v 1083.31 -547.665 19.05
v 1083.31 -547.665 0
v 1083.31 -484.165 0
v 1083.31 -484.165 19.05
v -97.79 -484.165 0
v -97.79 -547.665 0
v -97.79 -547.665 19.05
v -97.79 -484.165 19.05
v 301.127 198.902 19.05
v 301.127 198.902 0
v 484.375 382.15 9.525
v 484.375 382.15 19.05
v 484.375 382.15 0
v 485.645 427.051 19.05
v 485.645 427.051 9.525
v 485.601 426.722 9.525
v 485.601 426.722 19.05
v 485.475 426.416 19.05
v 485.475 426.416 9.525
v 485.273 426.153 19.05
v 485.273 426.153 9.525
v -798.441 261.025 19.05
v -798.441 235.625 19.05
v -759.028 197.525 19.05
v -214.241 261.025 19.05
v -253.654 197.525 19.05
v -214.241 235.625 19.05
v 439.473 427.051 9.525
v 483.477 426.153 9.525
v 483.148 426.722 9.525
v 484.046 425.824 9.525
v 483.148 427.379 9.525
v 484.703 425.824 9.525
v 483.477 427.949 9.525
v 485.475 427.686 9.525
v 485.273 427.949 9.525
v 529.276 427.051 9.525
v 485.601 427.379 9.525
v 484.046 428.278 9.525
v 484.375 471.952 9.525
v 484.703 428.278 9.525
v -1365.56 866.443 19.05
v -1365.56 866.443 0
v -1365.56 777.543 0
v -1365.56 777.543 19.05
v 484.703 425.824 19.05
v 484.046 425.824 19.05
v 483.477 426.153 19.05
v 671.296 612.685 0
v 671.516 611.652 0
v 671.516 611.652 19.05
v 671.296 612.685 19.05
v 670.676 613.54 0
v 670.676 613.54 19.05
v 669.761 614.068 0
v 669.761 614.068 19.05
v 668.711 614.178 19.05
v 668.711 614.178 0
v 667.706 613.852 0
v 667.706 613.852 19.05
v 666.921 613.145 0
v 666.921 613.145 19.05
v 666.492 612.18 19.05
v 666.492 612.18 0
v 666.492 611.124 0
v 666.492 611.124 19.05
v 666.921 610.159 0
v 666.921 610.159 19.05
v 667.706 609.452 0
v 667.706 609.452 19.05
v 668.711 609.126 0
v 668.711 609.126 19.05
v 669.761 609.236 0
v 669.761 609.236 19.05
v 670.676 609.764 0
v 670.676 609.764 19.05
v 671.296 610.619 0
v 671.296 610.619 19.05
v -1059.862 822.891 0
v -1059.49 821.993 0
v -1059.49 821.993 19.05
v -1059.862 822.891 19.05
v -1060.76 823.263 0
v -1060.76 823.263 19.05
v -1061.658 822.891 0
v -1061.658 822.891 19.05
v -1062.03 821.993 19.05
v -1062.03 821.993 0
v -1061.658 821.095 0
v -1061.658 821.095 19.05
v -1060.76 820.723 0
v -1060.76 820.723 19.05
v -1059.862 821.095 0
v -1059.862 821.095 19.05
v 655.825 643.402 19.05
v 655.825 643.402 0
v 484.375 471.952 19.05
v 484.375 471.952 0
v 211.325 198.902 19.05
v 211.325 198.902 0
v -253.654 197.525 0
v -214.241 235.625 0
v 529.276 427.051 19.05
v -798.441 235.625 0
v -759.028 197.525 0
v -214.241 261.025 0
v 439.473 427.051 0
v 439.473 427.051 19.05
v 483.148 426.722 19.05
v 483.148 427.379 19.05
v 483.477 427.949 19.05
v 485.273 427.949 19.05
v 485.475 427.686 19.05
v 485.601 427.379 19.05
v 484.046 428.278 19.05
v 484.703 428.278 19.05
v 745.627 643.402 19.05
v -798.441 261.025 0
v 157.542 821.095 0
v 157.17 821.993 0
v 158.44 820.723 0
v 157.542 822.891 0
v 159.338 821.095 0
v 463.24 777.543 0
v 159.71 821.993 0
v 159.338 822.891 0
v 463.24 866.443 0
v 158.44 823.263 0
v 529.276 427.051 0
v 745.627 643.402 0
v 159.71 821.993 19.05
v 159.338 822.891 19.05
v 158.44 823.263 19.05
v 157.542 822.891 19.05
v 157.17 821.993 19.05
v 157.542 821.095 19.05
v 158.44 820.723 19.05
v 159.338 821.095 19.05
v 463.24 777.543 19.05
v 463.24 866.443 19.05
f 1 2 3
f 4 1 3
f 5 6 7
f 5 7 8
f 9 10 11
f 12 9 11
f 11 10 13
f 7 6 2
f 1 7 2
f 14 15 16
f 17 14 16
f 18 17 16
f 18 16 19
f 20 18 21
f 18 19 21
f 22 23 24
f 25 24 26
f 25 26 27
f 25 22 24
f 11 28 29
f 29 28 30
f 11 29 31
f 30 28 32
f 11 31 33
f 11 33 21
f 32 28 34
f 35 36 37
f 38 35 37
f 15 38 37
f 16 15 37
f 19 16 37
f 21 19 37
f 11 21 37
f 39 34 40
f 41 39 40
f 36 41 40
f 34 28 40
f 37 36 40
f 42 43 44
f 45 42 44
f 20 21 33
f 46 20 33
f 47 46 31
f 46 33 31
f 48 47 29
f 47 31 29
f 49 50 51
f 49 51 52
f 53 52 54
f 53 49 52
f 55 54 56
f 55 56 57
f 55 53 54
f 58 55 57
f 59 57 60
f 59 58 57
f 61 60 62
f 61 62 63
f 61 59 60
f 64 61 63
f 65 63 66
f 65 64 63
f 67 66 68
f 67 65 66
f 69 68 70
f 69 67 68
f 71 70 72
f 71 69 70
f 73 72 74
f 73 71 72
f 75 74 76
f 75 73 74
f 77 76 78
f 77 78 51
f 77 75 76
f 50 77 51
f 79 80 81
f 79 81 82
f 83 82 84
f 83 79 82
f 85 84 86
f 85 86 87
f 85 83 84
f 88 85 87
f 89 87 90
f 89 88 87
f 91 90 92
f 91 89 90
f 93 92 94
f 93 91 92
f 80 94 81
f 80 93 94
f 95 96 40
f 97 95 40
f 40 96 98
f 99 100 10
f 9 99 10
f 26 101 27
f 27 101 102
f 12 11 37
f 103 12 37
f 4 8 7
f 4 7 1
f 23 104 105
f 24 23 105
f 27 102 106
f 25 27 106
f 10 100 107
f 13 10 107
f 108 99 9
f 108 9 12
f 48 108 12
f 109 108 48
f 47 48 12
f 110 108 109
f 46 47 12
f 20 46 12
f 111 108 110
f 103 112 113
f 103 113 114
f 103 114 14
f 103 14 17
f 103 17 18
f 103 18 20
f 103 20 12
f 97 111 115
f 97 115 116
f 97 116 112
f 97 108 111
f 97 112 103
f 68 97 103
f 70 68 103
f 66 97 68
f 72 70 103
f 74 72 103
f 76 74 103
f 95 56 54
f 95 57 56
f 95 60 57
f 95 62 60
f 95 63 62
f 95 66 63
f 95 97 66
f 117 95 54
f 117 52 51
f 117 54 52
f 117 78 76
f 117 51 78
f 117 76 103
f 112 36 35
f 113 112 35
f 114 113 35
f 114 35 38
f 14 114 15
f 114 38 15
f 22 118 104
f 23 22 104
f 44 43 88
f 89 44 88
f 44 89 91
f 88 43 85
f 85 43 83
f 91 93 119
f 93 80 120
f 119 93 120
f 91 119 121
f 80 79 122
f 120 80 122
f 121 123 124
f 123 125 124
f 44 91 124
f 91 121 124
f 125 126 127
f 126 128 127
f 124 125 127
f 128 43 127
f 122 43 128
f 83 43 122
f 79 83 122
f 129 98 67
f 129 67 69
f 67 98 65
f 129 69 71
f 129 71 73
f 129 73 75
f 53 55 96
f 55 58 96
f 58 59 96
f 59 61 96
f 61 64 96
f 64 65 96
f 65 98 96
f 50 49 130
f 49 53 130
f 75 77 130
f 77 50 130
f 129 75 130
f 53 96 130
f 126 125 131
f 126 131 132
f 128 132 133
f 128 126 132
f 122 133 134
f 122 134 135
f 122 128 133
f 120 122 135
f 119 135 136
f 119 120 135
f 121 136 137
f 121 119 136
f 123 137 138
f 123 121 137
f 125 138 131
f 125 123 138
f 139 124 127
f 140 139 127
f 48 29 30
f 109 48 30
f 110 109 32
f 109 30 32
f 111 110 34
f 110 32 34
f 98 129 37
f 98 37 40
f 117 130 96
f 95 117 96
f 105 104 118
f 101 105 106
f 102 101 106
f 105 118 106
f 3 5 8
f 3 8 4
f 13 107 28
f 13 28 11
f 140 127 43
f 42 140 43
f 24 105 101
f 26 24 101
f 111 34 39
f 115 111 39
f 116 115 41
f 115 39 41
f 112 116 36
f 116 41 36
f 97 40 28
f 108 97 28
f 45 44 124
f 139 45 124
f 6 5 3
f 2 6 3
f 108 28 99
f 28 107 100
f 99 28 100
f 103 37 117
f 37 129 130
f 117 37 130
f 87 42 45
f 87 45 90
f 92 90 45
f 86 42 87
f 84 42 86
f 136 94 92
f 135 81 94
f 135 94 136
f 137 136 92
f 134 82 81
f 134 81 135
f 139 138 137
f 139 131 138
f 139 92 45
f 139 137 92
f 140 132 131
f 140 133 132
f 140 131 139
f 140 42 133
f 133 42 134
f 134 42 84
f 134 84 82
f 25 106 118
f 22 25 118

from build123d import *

# Parameters (mm, degrees)
F0_R     = 1.27
F4_DEPTH = 19.05
F5_DEPTH = 19.05
F3_W     = 1181.1
F3_H     = 63.5
F6_DEPTH = 19.05
F2_R     = 2.54
F7_DEPTH = 19.05
F8_DEPTH = 9.525


with BuildPart() as f4:
    # F0 (on Top) → F4 (new body)
    with BuildSketch(Plane.XY):
        Polygon((463.2404299736, 866.4432381392), (-1365.5595700264, 866.4432381392), (-1365.5595700264, 777.5432381392), (463.2404299736, 777.5432381392), (463.2404299736, 821.9932381392), align=None)
        with Locations((-1060.7595700264, 821.9932381392)):
            Circle(F0_R, mode=Mode.SUBTRACT)
        with Locations((158.4404299736, 821.9932381392)):
            Circle(F0_R, mode=Mode.SUBTRACT)
    extrude(amount=F4_DEPTH)


with BuildPart() as f5:
    # F1 (on Top) → F5 (new body)
    with BuildSketch(Plane.XY):
        Polygon((-214.2413890027, 261.0249788087), (-506.3413890027, 261.0249788087), (-506.3413890027, 197.5249788087), (-253.6544868998, 197.5249788087), (-214.2413890027, 235.6249788087), align=None)
        Polygon((-506.3413890027, 261.0249788087), (-798.4413890027, 261.0249788087), (-798.4413890027, 235.6249788087), (-759.0282911055, 197.5249788087), (-506.3413890027, 197.5249788087), align=None)
    extrude(amount=F5_DEPTH)


with BuildPart() as f6:
    # F3 (on Top) → F6 (new body)
    with BuildSketch(Plane.XY):
        with Locations((492.76, -515.9154869616)):
            Rectangle(F3_W, F3_H)
    extrude(amount=F6_DEPTH)


with BuildPart() as f7:
    # F2 (on Top) → F7 (new body)
    with BuildSketch(Plane.XY):
        Polygon((484.3747253485, 382.1495120954), (439.4734447431, 427.0507927008), (211.3247253485, 198.9020733061), (301.1272865592, 198.9020733061), align=None)
        Polygon((529.2760059538, 427.0507927008), (484.3747253485, 471.9520733061), (439.4734447431, 427.0507927008), (484.3747253485, 382.1495120954), align=None)
        with BuildLine():
            ThreePointArc((485.2727509606, 427.9488183129), (485.5480523548, 427.5368006599), (485.6447253485, 427.0507927008))
            ThreePointArc((485.6447253485, 427.0507927008), (485.5480523548, 426.5647847417), (485.2727509606, 426.1527670887))
            ThreePointArc((485.2727509606, 426.1527670887), (484.3747253485, 425.7807927008), (483.4766997364, 426.1527670887))
            ThreePointArc((483.4766997364, 426.1527670887), (483.1047253485, 427.0507927008), (483.4766997364, 427.9488183129))
            ThreePointArc((483.4766997364, 427.9488183129), (484.3747253485, 428.3207927008), (485.2727509606, 427.9488183129))
        make_face(mode=Mode.SUBTRACT)
        Polygon((745.6272865592, 643.4020733061), (655.8247253485, 643.4020733061), (484.3747253485, 471.9520733061), (529.2760059538, 427.0507927008), align=None)
        with Locations((668.9760059538, 611.6520733061)):
            Circle(F2_R, mode=Mode.SUBTRACT)
    extrude(amount=F7_DEPTH)

    # F2 (on Top) → F8 (cut)
    with BuildSketch(Plane.XY):
        Polygon((529.2760059538, 427.0507927008), (484.3747253485, 471.9520733061), (439.4734447431, 427.0507927008), (484.3747253485, 382.1495120954), align=None)
        with BuildLine():
            ThreePointArc((485.2727509606, 427.9488183129), (485.5480523548, 427.5368006599), (485.6447253485, 427.0507927008))
            ThreePointArc((485.6447253485, 427.0507927008), (485.5480523548, 426.5647847417), (485.2727509606, 426.1527670887))
            ThreePointArc((485.2727509606, 426.1527670887), (484.3747253485, 425.7807927008), (483.4766997364, 426.1527670887))
            ThreePointArc((483.4766997364, 426.1527670887), (483.1047253485, 427.0507927008), (483.4766997364, 427.9488183129))
            ThreePointArc((483.4766997364, 427.9488183129), (484.3747253485, 428.3207927008), (485.2727509606, 427.9488183129))
        make_face(mode=Mode.SUBTRACT)
    extrude(amount=F8_DEPTH, mode=Mode.SUBTRACT)


solid = Compound([f4.part, f5.part, f6.part, f7.part])
